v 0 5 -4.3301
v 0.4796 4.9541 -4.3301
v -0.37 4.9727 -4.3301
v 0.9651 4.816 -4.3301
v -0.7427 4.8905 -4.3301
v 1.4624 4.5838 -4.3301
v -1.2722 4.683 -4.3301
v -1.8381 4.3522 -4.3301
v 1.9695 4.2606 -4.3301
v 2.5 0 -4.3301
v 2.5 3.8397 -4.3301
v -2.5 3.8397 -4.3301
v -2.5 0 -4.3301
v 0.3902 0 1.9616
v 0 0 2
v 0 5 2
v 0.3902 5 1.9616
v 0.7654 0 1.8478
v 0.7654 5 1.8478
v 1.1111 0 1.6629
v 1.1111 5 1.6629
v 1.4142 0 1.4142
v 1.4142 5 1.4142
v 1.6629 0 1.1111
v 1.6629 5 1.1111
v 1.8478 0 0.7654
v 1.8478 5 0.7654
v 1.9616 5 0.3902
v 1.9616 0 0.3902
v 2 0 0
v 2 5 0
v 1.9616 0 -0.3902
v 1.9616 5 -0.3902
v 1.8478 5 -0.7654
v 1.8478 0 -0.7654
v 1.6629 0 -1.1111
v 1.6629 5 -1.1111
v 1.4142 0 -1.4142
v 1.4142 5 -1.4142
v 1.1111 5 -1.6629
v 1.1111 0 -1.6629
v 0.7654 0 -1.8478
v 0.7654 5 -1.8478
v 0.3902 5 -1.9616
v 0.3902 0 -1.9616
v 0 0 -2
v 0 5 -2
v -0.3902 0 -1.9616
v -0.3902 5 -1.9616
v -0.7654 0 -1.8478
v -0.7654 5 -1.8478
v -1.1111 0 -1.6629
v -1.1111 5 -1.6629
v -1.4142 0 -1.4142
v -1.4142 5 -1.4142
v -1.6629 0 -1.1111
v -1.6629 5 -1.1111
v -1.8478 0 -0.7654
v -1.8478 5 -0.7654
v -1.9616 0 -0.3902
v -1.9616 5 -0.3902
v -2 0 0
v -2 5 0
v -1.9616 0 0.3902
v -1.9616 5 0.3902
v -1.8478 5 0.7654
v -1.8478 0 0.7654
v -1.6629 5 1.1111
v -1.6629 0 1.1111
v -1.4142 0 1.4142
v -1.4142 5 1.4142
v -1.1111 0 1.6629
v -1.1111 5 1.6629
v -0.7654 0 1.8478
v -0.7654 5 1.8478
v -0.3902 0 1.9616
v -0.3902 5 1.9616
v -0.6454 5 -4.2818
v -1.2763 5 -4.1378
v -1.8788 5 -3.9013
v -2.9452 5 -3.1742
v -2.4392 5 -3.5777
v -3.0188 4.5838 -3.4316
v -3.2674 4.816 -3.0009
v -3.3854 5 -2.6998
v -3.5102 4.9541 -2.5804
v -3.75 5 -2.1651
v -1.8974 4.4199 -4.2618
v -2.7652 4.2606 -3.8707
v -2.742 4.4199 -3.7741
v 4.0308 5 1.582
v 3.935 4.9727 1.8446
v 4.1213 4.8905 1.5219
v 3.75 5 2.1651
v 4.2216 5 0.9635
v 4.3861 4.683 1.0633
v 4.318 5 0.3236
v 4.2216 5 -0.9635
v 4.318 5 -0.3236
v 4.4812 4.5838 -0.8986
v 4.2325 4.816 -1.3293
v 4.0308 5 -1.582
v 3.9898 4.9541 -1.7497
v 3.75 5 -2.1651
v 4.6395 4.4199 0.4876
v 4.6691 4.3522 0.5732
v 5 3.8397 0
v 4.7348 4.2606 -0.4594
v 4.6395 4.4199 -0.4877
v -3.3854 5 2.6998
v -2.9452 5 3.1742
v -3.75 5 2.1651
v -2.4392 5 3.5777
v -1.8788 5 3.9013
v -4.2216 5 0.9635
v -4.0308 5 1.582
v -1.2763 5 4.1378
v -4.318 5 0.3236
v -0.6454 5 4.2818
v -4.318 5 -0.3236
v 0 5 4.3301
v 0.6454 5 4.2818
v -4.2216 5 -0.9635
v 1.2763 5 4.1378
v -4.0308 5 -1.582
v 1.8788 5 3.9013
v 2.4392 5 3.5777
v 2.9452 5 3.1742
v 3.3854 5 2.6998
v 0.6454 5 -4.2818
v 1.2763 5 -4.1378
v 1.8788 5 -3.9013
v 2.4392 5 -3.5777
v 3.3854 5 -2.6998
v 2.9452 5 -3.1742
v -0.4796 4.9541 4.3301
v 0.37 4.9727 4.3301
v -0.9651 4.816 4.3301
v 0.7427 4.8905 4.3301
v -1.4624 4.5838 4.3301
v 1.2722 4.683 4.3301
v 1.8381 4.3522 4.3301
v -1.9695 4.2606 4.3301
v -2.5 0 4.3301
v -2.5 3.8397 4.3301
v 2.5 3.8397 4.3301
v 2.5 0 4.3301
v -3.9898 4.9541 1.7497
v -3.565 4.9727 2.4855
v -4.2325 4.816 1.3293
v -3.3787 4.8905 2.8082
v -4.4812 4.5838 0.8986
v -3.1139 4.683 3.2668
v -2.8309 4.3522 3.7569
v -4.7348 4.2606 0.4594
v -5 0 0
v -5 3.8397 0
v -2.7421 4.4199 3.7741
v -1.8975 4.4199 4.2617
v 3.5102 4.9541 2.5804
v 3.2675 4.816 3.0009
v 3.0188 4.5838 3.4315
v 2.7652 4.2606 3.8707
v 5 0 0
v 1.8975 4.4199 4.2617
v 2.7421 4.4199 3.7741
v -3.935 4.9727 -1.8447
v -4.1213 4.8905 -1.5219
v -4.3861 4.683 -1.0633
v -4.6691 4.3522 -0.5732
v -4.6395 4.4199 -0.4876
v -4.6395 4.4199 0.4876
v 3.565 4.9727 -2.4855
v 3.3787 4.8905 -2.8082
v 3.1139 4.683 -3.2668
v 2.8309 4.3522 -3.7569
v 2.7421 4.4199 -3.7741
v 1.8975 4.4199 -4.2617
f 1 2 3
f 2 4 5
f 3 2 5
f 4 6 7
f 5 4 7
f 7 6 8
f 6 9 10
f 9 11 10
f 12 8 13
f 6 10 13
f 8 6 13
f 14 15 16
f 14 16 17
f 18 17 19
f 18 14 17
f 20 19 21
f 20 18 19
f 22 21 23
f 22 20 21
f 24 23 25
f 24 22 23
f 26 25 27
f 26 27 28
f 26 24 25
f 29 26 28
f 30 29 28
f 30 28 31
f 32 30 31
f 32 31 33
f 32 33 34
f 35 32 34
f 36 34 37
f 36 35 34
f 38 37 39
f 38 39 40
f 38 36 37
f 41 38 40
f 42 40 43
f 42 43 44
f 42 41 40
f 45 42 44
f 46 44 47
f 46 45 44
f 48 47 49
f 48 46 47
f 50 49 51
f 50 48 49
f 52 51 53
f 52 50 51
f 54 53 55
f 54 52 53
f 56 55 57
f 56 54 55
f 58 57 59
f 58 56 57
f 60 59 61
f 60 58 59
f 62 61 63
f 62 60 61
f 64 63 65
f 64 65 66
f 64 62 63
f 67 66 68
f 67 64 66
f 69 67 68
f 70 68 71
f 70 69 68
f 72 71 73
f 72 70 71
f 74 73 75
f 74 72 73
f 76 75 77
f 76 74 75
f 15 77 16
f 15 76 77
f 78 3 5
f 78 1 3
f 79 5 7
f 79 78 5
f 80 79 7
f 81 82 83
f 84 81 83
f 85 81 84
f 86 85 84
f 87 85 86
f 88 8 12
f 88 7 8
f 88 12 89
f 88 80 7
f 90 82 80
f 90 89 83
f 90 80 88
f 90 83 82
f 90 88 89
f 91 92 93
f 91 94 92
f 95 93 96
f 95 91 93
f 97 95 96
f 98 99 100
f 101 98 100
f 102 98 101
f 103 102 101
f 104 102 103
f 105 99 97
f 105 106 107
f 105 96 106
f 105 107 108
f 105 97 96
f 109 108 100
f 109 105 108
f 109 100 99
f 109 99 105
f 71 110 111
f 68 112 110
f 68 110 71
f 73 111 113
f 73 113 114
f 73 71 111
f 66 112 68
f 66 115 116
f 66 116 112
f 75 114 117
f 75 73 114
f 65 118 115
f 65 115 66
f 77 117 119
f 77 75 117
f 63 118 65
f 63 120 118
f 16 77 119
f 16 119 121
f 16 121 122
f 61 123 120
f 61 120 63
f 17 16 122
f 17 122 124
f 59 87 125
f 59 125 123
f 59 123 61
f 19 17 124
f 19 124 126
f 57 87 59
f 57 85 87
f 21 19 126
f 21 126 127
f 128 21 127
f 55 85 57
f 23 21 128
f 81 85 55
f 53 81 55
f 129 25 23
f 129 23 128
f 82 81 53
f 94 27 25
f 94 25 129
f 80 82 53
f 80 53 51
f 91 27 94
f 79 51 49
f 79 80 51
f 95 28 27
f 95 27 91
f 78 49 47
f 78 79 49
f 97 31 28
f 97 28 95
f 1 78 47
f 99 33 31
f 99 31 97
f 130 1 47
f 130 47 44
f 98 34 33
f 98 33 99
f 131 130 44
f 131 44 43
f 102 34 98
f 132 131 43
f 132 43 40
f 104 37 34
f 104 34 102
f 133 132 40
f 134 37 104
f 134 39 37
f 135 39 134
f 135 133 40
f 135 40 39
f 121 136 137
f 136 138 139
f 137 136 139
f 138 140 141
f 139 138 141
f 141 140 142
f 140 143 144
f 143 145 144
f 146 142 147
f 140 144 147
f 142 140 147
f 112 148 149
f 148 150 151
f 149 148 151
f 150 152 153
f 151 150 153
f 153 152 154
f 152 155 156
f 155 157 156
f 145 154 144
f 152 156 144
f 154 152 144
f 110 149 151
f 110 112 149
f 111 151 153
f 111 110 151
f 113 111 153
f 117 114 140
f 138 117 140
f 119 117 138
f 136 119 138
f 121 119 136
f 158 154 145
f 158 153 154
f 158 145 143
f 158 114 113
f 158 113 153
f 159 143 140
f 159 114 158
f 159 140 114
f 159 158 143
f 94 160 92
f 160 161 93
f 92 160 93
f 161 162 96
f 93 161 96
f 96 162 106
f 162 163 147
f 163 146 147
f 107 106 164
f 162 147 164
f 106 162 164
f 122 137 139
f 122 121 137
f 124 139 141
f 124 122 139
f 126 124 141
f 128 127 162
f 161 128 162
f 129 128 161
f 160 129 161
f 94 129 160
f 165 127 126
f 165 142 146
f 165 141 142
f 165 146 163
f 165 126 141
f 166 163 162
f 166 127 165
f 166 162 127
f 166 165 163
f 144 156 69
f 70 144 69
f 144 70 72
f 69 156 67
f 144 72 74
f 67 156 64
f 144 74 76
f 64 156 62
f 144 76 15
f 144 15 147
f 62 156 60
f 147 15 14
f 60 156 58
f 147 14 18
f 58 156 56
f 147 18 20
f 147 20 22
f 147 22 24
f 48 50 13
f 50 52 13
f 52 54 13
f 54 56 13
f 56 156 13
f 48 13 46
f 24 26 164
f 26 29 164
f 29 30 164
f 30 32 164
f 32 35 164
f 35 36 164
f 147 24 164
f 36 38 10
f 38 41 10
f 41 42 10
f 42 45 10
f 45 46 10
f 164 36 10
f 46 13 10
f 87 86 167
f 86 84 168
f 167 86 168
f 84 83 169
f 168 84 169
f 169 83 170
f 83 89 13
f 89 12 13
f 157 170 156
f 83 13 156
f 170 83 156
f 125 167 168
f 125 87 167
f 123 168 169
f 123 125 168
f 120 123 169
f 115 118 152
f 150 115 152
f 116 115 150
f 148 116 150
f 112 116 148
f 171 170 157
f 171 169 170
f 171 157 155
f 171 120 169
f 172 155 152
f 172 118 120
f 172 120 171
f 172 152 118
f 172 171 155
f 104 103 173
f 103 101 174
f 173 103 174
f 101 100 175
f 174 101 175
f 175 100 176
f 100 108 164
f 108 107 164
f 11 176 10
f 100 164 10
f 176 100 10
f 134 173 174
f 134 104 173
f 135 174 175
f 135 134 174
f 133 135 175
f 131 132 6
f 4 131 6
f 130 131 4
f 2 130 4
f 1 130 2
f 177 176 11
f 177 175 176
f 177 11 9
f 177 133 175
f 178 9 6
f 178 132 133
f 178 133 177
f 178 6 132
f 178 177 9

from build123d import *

# Parameters (mm, degrees)
SKETCH1_R           = 2
BOSS_EXTRUDE1_DEPTH = 5
SKETCH2_OUTSIDE_W   = 25.558
SKETCH2_OUTSIDE_H   = 24.218
SKETCH2_OUTSIDE_R   = 4.330127019
CUT_EXTRUDE1_DEPTH  = 9.291561976
CUT_EXTRUDE1_DRAFT  = -30


with BuildPart() as part:
    # Sketch1 → Boss-Extrude1 (new body)
    with BuildSketch(Plane(origin=(0, 0, 0), x_dir=(1, 0, 0), z_dir=(0, 1, 0))):
        Polygon((5, 0), (2.5, 4.330127019), (-2.5, 4.330127019), (-5, 0), (-2.5, -4.330127019), (2.5, -4.330127019), align=None)
        with Locations(Location((0, 0, 0), (0, 0, 270))):
            Circle(SKETCH1_R, mode=Mode.SUBTRACT)
    extrude(amount=BOSS_EXTRUDE1_DEPTH)


with BuildPart() as cut_extrude1_tool:
    # Sketch2 outside → Cut-Extrude1 (with draft: the straight prism first)
    with BuildSketch(Plane(origin=(0, 5, 0), x_dir=(1, 0, 0), z_dir=(0, 1, 0))):
        Rectangle(SKETCH2_OUTSIDE_W, SKETCH2_OUTSIDE_H)
        Circle(SKETCH2_OUTSIDE_R, mode=Mode.SUBTRACT)
    extrude(amount=-CUT_EXTRUDE1_DEPTH)
    # Cut-Extrude1: the draft: its side faces are tilted about the plane it starts from
    cut_extrude1_sides = [cut_extrude1_tool.faces().sort_by_distance(p)[0] for p in [
        (0, 0.354219012, 12.109),
        (12.779, 0.354219012, 0),
        (0, 0.354219012, -12.109),
        (-12.779, 0.354219012, 0),
        (-4.330127019, 0.354219012, 0),
    ]]
    draft(cut_extrude1_sides, Plane(origin=(0, 5, 0), x_dir=(1, 0, 0), z_dir=(0, 1, 0)), CUT_EXTRUDE1_DRAFT)


with BuildPart() as part_1:
    add(part.part)

    # Cut-Extrude1: cut by cut_extrude1_tool
    add(cut_extrude1_tool.part, mode=Mode.SUBTRACT)


solid = part_1.part
